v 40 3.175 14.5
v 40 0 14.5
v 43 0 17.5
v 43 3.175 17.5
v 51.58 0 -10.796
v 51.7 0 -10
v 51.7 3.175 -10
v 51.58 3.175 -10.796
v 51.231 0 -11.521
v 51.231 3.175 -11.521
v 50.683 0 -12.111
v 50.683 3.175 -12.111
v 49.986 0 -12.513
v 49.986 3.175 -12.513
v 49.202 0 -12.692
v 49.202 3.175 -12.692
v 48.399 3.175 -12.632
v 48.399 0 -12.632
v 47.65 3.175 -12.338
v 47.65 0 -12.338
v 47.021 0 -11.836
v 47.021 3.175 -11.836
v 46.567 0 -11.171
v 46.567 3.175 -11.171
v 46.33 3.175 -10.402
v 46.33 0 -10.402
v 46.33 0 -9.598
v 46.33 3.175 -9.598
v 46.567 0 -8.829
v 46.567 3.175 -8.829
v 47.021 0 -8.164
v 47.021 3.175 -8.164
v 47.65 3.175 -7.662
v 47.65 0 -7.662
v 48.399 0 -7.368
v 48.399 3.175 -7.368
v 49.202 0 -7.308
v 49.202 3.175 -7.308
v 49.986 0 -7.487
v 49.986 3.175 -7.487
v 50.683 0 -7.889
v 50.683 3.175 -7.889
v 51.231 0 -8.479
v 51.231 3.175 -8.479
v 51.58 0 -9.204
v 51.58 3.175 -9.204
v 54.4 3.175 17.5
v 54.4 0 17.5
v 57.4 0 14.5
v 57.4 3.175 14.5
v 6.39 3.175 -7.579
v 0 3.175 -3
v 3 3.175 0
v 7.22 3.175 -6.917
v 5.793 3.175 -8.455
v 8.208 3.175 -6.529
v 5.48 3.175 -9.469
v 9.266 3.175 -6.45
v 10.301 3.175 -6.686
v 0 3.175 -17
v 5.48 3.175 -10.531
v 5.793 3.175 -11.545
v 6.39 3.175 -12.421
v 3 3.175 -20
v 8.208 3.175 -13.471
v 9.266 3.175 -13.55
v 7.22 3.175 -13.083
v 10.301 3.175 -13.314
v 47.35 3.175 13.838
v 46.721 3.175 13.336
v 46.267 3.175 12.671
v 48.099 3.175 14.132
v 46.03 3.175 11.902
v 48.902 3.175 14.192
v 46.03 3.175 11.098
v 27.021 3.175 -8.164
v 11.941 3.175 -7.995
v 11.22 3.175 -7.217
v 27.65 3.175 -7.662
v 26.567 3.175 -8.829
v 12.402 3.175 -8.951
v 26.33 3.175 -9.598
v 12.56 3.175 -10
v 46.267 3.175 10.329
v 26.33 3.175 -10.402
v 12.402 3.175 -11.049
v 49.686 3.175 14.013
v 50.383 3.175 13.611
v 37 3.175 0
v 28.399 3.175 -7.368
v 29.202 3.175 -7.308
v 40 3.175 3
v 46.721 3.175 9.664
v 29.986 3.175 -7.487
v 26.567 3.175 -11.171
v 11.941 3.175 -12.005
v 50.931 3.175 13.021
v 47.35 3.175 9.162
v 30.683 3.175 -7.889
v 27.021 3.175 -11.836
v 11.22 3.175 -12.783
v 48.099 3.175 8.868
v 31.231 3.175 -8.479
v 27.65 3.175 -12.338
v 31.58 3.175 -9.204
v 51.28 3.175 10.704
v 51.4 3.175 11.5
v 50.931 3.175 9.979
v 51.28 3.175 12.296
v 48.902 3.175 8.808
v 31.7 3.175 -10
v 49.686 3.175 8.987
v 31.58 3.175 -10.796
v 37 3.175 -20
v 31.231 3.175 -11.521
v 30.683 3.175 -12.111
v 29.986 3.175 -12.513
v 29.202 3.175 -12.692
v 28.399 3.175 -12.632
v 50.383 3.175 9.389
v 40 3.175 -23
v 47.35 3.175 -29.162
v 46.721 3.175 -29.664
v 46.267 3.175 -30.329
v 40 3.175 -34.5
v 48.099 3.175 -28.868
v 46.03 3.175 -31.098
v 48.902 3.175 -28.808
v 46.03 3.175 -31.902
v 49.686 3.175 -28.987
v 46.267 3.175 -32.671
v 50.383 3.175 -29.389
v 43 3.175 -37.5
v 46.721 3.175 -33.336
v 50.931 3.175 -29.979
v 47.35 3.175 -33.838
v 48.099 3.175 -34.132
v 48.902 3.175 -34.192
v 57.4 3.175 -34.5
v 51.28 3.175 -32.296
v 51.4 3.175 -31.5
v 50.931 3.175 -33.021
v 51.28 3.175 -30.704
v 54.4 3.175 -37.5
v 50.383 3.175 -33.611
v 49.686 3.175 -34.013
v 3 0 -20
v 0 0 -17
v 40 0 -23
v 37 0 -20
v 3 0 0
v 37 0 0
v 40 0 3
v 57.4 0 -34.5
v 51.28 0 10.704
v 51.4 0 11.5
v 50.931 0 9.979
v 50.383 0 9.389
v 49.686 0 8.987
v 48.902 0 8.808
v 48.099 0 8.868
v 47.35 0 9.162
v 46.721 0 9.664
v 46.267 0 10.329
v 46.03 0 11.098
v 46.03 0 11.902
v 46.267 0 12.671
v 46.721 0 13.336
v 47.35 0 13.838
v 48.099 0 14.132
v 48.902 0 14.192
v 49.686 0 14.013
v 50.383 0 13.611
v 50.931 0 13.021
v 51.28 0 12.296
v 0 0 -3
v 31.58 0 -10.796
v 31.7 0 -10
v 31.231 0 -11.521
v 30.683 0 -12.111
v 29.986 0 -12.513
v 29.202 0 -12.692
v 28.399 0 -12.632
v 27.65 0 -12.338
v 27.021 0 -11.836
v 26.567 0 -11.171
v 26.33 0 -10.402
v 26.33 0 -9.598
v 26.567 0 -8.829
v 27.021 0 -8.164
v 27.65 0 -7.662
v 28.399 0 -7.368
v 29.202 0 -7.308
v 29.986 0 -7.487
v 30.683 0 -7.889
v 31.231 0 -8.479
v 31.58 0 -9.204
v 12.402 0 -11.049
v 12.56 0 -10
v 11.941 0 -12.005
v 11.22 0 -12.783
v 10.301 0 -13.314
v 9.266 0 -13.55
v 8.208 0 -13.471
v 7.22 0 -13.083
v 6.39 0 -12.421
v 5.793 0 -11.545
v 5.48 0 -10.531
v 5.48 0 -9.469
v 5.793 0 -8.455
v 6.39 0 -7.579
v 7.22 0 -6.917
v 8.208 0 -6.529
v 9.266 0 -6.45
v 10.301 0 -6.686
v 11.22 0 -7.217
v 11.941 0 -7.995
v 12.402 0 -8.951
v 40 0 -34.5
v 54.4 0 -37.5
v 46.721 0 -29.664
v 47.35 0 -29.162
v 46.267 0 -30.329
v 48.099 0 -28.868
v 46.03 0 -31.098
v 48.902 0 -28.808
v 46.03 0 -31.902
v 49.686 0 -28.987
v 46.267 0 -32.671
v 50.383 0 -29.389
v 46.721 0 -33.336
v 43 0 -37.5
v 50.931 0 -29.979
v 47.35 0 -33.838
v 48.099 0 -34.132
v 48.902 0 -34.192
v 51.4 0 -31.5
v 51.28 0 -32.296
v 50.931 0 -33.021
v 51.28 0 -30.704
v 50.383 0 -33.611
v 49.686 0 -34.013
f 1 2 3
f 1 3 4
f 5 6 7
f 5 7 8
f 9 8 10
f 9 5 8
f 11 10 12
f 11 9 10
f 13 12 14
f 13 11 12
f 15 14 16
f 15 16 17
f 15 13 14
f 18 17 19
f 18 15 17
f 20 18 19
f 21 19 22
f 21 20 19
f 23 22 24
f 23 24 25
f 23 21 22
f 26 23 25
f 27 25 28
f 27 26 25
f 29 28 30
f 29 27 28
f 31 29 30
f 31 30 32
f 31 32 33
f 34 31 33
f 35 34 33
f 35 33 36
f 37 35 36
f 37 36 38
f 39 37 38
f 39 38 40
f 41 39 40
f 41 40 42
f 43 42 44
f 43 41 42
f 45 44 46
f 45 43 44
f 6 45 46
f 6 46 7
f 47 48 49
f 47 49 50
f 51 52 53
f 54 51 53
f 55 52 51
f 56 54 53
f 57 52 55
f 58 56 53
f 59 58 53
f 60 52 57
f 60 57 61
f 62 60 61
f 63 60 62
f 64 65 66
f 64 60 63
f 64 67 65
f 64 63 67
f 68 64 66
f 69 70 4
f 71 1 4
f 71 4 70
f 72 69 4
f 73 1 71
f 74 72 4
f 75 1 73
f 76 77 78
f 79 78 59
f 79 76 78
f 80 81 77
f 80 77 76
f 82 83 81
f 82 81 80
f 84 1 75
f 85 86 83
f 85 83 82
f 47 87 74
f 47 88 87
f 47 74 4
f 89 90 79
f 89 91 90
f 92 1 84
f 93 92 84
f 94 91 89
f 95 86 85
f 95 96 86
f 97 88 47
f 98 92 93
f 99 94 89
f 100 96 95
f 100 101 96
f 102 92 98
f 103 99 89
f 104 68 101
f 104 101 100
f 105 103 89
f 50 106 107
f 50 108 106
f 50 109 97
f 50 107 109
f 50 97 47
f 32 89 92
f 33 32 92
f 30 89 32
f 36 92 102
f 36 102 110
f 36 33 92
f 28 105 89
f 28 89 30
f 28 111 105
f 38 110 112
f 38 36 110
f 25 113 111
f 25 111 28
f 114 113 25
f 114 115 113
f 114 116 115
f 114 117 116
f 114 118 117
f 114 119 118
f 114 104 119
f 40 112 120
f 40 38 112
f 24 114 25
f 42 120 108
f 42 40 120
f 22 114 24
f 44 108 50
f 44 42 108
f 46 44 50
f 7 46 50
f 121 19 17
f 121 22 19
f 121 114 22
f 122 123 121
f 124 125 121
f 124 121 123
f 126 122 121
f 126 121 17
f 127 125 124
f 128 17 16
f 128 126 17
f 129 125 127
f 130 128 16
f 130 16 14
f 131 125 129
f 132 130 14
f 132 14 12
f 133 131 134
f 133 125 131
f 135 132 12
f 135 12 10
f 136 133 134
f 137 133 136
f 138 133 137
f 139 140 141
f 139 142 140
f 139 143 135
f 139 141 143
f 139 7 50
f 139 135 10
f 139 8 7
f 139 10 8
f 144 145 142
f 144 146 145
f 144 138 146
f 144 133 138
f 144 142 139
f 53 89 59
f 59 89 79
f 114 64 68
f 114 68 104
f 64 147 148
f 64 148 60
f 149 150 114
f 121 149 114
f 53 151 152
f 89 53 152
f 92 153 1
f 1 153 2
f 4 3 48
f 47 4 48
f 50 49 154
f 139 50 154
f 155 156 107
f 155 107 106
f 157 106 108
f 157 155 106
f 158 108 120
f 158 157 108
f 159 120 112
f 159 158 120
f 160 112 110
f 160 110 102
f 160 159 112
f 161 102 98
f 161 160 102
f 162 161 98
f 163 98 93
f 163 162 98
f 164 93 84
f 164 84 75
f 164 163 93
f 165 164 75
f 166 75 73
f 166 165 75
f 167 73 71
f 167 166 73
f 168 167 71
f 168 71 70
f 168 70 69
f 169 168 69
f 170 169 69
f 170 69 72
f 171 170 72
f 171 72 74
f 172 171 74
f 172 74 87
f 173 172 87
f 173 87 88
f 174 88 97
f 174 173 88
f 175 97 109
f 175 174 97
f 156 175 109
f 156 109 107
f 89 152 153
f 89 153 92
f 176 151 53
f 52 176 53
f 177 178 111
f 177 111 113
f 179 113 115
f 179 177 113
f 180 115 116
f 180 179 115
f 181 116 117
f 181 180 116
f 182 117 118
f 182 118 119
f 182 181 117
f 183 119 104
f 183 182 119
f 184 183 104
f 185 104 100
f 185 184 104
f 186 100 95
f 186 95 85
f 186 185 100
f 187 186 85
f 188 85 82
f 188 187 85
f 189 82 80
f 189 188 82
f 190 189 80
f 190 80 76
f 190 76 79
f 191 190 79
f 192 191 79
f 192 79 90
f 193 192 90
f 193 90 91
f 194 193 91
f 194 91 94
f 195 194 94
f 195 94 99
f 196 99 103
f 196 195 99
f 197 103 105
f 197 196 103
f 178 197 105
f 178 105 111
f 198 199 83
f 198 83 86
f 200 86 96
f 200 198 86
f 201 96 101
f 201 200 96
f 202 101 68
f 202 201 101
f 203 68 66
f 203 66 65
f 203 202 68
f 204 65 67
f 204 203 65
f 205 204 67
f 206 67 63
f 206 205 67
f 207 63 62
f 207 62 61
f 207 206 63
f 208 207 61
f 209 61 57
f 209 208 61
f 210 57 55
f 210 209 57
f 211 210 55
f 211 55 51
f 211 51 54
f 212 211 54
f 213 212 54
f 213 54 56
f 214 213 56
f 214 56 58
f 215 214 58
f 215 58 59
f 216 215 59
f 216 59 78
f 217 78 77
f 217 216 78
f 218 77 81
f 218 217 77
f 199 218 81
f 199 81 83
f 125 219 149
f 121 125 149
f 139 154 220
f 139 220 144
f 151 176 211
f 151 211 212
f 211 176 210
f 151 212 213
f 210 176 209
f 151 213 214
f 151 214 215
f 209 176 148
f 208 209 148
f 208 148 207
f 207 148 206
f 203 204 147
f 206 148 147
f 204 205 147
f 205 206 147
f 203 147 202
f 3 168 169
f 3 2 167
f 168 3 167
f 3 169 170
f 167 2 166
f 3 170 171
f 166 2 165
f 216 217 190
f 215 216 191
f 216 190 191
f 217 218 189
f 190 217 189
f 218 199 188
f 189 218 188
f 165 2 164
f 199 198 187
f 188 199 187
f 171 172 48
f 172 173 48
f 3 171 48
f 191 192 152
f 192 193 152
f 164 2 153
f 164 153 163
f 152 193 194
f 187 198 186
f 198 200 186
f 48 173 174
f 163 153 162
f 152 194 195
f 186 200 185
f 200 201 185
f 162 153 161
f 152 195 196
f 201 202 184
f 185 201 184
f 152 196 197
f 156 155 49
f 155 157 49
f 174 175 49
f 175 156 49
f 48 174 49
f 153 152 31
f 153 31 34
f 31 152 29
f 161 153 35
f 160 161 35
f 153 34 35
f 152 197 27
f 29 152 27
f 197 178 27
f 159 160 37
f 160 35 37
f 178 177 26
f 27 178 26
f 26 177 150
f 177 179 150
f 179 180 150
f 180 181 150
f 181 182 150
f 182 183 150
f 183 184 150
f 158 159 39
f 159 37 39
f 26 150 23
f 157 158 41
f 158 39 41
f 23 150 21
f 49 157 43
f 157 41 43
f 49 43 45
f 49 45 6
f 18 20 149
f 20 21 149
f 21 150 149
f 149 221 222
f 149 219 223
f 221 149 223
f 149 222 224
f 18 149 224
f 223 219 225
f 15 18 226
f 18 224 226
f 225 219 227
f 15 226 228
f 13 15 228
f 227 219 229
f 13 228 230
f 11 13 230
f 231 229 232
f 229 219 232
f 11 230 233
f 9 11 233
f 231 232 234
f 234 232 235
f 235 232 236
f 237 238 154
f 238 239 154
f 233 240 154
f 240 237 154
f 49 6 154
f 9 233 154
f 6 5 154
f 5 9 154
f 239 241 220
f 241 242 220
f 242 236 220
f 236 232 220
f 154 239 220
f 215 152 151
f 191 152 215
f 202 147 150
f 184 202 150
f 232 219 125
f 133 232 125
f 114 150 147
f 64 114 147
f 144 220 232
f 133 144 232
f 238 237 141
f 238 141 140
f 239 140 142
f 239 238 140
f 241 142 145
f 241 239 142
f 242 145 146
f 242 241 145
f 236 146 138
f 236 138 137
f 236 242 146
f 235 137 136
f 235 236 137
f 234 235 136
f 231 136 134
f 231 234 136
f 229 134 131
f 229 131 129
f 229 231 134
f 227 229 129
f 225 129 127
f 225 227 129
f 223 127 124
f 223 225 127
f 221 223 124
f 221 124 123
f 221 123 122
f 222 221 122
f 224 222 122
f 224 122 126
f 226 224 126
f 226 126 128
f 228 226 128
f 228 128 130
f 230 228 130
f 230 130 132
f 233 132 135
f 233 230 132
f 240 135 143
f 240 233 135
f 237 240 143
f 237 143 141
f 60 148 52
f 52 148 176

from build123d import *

# Parameters (mm, degrees)
SKETCH1_R           = 2.7
SKETCH1_R_2         = 3.56
BOSS_EXTRUDE1_DEPTH = 3.175
CHAMFER1_SIZE       = 3
CHAMFER2_SIZE       = 3


with BuildPart() as part:
    # Sketch1 → Boss-Extrude1 (new body)
    with BuildSketch(Plane(origin=(0, 0, 0), x_dir=(1, 0, 0), z_dir=(0, 1, 0))):
        Polygon((0, 0), (40, 0), (40, -17.5), (57.4, -17.5), (57.4, 37.5), (40, 37.5), (40, 20), (0, 20), align=None)
        with Locations((29, 10)):
            Circle(SKETCH1_R, mode=Mode.SUBTRACT)
        with Locations((9, 10)):
            Circle(SKETCH1_R_2, mode=Mode.SUBTRACT)
        with Locations((48.7, 31.5)):
            Circle(SKETCH1_R, mode=Mode.SUBTRACT)
        with Locations((48.7, -11.5)):
            Circle(SKETCH1_R, mode=Mode.SUBTRACT)
        with Locations((49, 10)):
            Circle(SKETCH1_R, mode=Mode.SUBTRACT)
    extrude(amount=BOSS_EXTRUDE1_DEPTH)

    # Chamfer1
    chamfer1_edges = [part.edges().sort_by_distance(p)[0] for p in [
        (0, 1.5875, -20),
        (40, 1.5875, -37.5),
        (57.4, 1.5875, -37.5),
        (57.4, 1.5875, 17.5),
        (40, 1.5875, 17.5),
        (0, 1.5875, 0),
    ]]
    chamfer(chamfer1_edges, length=CHAMFER1_SIZE)

    # Chamfer2
    chamfer2_edges = [part.edges().sort_by_distance(p)[0] for p in [
        (40, 1.5875, -20),
        (40, 1.5875, 0),
    ]]
    chamfer(chamfer2_edges, length=CHAMFER2_SIZE)


solid = part.part
